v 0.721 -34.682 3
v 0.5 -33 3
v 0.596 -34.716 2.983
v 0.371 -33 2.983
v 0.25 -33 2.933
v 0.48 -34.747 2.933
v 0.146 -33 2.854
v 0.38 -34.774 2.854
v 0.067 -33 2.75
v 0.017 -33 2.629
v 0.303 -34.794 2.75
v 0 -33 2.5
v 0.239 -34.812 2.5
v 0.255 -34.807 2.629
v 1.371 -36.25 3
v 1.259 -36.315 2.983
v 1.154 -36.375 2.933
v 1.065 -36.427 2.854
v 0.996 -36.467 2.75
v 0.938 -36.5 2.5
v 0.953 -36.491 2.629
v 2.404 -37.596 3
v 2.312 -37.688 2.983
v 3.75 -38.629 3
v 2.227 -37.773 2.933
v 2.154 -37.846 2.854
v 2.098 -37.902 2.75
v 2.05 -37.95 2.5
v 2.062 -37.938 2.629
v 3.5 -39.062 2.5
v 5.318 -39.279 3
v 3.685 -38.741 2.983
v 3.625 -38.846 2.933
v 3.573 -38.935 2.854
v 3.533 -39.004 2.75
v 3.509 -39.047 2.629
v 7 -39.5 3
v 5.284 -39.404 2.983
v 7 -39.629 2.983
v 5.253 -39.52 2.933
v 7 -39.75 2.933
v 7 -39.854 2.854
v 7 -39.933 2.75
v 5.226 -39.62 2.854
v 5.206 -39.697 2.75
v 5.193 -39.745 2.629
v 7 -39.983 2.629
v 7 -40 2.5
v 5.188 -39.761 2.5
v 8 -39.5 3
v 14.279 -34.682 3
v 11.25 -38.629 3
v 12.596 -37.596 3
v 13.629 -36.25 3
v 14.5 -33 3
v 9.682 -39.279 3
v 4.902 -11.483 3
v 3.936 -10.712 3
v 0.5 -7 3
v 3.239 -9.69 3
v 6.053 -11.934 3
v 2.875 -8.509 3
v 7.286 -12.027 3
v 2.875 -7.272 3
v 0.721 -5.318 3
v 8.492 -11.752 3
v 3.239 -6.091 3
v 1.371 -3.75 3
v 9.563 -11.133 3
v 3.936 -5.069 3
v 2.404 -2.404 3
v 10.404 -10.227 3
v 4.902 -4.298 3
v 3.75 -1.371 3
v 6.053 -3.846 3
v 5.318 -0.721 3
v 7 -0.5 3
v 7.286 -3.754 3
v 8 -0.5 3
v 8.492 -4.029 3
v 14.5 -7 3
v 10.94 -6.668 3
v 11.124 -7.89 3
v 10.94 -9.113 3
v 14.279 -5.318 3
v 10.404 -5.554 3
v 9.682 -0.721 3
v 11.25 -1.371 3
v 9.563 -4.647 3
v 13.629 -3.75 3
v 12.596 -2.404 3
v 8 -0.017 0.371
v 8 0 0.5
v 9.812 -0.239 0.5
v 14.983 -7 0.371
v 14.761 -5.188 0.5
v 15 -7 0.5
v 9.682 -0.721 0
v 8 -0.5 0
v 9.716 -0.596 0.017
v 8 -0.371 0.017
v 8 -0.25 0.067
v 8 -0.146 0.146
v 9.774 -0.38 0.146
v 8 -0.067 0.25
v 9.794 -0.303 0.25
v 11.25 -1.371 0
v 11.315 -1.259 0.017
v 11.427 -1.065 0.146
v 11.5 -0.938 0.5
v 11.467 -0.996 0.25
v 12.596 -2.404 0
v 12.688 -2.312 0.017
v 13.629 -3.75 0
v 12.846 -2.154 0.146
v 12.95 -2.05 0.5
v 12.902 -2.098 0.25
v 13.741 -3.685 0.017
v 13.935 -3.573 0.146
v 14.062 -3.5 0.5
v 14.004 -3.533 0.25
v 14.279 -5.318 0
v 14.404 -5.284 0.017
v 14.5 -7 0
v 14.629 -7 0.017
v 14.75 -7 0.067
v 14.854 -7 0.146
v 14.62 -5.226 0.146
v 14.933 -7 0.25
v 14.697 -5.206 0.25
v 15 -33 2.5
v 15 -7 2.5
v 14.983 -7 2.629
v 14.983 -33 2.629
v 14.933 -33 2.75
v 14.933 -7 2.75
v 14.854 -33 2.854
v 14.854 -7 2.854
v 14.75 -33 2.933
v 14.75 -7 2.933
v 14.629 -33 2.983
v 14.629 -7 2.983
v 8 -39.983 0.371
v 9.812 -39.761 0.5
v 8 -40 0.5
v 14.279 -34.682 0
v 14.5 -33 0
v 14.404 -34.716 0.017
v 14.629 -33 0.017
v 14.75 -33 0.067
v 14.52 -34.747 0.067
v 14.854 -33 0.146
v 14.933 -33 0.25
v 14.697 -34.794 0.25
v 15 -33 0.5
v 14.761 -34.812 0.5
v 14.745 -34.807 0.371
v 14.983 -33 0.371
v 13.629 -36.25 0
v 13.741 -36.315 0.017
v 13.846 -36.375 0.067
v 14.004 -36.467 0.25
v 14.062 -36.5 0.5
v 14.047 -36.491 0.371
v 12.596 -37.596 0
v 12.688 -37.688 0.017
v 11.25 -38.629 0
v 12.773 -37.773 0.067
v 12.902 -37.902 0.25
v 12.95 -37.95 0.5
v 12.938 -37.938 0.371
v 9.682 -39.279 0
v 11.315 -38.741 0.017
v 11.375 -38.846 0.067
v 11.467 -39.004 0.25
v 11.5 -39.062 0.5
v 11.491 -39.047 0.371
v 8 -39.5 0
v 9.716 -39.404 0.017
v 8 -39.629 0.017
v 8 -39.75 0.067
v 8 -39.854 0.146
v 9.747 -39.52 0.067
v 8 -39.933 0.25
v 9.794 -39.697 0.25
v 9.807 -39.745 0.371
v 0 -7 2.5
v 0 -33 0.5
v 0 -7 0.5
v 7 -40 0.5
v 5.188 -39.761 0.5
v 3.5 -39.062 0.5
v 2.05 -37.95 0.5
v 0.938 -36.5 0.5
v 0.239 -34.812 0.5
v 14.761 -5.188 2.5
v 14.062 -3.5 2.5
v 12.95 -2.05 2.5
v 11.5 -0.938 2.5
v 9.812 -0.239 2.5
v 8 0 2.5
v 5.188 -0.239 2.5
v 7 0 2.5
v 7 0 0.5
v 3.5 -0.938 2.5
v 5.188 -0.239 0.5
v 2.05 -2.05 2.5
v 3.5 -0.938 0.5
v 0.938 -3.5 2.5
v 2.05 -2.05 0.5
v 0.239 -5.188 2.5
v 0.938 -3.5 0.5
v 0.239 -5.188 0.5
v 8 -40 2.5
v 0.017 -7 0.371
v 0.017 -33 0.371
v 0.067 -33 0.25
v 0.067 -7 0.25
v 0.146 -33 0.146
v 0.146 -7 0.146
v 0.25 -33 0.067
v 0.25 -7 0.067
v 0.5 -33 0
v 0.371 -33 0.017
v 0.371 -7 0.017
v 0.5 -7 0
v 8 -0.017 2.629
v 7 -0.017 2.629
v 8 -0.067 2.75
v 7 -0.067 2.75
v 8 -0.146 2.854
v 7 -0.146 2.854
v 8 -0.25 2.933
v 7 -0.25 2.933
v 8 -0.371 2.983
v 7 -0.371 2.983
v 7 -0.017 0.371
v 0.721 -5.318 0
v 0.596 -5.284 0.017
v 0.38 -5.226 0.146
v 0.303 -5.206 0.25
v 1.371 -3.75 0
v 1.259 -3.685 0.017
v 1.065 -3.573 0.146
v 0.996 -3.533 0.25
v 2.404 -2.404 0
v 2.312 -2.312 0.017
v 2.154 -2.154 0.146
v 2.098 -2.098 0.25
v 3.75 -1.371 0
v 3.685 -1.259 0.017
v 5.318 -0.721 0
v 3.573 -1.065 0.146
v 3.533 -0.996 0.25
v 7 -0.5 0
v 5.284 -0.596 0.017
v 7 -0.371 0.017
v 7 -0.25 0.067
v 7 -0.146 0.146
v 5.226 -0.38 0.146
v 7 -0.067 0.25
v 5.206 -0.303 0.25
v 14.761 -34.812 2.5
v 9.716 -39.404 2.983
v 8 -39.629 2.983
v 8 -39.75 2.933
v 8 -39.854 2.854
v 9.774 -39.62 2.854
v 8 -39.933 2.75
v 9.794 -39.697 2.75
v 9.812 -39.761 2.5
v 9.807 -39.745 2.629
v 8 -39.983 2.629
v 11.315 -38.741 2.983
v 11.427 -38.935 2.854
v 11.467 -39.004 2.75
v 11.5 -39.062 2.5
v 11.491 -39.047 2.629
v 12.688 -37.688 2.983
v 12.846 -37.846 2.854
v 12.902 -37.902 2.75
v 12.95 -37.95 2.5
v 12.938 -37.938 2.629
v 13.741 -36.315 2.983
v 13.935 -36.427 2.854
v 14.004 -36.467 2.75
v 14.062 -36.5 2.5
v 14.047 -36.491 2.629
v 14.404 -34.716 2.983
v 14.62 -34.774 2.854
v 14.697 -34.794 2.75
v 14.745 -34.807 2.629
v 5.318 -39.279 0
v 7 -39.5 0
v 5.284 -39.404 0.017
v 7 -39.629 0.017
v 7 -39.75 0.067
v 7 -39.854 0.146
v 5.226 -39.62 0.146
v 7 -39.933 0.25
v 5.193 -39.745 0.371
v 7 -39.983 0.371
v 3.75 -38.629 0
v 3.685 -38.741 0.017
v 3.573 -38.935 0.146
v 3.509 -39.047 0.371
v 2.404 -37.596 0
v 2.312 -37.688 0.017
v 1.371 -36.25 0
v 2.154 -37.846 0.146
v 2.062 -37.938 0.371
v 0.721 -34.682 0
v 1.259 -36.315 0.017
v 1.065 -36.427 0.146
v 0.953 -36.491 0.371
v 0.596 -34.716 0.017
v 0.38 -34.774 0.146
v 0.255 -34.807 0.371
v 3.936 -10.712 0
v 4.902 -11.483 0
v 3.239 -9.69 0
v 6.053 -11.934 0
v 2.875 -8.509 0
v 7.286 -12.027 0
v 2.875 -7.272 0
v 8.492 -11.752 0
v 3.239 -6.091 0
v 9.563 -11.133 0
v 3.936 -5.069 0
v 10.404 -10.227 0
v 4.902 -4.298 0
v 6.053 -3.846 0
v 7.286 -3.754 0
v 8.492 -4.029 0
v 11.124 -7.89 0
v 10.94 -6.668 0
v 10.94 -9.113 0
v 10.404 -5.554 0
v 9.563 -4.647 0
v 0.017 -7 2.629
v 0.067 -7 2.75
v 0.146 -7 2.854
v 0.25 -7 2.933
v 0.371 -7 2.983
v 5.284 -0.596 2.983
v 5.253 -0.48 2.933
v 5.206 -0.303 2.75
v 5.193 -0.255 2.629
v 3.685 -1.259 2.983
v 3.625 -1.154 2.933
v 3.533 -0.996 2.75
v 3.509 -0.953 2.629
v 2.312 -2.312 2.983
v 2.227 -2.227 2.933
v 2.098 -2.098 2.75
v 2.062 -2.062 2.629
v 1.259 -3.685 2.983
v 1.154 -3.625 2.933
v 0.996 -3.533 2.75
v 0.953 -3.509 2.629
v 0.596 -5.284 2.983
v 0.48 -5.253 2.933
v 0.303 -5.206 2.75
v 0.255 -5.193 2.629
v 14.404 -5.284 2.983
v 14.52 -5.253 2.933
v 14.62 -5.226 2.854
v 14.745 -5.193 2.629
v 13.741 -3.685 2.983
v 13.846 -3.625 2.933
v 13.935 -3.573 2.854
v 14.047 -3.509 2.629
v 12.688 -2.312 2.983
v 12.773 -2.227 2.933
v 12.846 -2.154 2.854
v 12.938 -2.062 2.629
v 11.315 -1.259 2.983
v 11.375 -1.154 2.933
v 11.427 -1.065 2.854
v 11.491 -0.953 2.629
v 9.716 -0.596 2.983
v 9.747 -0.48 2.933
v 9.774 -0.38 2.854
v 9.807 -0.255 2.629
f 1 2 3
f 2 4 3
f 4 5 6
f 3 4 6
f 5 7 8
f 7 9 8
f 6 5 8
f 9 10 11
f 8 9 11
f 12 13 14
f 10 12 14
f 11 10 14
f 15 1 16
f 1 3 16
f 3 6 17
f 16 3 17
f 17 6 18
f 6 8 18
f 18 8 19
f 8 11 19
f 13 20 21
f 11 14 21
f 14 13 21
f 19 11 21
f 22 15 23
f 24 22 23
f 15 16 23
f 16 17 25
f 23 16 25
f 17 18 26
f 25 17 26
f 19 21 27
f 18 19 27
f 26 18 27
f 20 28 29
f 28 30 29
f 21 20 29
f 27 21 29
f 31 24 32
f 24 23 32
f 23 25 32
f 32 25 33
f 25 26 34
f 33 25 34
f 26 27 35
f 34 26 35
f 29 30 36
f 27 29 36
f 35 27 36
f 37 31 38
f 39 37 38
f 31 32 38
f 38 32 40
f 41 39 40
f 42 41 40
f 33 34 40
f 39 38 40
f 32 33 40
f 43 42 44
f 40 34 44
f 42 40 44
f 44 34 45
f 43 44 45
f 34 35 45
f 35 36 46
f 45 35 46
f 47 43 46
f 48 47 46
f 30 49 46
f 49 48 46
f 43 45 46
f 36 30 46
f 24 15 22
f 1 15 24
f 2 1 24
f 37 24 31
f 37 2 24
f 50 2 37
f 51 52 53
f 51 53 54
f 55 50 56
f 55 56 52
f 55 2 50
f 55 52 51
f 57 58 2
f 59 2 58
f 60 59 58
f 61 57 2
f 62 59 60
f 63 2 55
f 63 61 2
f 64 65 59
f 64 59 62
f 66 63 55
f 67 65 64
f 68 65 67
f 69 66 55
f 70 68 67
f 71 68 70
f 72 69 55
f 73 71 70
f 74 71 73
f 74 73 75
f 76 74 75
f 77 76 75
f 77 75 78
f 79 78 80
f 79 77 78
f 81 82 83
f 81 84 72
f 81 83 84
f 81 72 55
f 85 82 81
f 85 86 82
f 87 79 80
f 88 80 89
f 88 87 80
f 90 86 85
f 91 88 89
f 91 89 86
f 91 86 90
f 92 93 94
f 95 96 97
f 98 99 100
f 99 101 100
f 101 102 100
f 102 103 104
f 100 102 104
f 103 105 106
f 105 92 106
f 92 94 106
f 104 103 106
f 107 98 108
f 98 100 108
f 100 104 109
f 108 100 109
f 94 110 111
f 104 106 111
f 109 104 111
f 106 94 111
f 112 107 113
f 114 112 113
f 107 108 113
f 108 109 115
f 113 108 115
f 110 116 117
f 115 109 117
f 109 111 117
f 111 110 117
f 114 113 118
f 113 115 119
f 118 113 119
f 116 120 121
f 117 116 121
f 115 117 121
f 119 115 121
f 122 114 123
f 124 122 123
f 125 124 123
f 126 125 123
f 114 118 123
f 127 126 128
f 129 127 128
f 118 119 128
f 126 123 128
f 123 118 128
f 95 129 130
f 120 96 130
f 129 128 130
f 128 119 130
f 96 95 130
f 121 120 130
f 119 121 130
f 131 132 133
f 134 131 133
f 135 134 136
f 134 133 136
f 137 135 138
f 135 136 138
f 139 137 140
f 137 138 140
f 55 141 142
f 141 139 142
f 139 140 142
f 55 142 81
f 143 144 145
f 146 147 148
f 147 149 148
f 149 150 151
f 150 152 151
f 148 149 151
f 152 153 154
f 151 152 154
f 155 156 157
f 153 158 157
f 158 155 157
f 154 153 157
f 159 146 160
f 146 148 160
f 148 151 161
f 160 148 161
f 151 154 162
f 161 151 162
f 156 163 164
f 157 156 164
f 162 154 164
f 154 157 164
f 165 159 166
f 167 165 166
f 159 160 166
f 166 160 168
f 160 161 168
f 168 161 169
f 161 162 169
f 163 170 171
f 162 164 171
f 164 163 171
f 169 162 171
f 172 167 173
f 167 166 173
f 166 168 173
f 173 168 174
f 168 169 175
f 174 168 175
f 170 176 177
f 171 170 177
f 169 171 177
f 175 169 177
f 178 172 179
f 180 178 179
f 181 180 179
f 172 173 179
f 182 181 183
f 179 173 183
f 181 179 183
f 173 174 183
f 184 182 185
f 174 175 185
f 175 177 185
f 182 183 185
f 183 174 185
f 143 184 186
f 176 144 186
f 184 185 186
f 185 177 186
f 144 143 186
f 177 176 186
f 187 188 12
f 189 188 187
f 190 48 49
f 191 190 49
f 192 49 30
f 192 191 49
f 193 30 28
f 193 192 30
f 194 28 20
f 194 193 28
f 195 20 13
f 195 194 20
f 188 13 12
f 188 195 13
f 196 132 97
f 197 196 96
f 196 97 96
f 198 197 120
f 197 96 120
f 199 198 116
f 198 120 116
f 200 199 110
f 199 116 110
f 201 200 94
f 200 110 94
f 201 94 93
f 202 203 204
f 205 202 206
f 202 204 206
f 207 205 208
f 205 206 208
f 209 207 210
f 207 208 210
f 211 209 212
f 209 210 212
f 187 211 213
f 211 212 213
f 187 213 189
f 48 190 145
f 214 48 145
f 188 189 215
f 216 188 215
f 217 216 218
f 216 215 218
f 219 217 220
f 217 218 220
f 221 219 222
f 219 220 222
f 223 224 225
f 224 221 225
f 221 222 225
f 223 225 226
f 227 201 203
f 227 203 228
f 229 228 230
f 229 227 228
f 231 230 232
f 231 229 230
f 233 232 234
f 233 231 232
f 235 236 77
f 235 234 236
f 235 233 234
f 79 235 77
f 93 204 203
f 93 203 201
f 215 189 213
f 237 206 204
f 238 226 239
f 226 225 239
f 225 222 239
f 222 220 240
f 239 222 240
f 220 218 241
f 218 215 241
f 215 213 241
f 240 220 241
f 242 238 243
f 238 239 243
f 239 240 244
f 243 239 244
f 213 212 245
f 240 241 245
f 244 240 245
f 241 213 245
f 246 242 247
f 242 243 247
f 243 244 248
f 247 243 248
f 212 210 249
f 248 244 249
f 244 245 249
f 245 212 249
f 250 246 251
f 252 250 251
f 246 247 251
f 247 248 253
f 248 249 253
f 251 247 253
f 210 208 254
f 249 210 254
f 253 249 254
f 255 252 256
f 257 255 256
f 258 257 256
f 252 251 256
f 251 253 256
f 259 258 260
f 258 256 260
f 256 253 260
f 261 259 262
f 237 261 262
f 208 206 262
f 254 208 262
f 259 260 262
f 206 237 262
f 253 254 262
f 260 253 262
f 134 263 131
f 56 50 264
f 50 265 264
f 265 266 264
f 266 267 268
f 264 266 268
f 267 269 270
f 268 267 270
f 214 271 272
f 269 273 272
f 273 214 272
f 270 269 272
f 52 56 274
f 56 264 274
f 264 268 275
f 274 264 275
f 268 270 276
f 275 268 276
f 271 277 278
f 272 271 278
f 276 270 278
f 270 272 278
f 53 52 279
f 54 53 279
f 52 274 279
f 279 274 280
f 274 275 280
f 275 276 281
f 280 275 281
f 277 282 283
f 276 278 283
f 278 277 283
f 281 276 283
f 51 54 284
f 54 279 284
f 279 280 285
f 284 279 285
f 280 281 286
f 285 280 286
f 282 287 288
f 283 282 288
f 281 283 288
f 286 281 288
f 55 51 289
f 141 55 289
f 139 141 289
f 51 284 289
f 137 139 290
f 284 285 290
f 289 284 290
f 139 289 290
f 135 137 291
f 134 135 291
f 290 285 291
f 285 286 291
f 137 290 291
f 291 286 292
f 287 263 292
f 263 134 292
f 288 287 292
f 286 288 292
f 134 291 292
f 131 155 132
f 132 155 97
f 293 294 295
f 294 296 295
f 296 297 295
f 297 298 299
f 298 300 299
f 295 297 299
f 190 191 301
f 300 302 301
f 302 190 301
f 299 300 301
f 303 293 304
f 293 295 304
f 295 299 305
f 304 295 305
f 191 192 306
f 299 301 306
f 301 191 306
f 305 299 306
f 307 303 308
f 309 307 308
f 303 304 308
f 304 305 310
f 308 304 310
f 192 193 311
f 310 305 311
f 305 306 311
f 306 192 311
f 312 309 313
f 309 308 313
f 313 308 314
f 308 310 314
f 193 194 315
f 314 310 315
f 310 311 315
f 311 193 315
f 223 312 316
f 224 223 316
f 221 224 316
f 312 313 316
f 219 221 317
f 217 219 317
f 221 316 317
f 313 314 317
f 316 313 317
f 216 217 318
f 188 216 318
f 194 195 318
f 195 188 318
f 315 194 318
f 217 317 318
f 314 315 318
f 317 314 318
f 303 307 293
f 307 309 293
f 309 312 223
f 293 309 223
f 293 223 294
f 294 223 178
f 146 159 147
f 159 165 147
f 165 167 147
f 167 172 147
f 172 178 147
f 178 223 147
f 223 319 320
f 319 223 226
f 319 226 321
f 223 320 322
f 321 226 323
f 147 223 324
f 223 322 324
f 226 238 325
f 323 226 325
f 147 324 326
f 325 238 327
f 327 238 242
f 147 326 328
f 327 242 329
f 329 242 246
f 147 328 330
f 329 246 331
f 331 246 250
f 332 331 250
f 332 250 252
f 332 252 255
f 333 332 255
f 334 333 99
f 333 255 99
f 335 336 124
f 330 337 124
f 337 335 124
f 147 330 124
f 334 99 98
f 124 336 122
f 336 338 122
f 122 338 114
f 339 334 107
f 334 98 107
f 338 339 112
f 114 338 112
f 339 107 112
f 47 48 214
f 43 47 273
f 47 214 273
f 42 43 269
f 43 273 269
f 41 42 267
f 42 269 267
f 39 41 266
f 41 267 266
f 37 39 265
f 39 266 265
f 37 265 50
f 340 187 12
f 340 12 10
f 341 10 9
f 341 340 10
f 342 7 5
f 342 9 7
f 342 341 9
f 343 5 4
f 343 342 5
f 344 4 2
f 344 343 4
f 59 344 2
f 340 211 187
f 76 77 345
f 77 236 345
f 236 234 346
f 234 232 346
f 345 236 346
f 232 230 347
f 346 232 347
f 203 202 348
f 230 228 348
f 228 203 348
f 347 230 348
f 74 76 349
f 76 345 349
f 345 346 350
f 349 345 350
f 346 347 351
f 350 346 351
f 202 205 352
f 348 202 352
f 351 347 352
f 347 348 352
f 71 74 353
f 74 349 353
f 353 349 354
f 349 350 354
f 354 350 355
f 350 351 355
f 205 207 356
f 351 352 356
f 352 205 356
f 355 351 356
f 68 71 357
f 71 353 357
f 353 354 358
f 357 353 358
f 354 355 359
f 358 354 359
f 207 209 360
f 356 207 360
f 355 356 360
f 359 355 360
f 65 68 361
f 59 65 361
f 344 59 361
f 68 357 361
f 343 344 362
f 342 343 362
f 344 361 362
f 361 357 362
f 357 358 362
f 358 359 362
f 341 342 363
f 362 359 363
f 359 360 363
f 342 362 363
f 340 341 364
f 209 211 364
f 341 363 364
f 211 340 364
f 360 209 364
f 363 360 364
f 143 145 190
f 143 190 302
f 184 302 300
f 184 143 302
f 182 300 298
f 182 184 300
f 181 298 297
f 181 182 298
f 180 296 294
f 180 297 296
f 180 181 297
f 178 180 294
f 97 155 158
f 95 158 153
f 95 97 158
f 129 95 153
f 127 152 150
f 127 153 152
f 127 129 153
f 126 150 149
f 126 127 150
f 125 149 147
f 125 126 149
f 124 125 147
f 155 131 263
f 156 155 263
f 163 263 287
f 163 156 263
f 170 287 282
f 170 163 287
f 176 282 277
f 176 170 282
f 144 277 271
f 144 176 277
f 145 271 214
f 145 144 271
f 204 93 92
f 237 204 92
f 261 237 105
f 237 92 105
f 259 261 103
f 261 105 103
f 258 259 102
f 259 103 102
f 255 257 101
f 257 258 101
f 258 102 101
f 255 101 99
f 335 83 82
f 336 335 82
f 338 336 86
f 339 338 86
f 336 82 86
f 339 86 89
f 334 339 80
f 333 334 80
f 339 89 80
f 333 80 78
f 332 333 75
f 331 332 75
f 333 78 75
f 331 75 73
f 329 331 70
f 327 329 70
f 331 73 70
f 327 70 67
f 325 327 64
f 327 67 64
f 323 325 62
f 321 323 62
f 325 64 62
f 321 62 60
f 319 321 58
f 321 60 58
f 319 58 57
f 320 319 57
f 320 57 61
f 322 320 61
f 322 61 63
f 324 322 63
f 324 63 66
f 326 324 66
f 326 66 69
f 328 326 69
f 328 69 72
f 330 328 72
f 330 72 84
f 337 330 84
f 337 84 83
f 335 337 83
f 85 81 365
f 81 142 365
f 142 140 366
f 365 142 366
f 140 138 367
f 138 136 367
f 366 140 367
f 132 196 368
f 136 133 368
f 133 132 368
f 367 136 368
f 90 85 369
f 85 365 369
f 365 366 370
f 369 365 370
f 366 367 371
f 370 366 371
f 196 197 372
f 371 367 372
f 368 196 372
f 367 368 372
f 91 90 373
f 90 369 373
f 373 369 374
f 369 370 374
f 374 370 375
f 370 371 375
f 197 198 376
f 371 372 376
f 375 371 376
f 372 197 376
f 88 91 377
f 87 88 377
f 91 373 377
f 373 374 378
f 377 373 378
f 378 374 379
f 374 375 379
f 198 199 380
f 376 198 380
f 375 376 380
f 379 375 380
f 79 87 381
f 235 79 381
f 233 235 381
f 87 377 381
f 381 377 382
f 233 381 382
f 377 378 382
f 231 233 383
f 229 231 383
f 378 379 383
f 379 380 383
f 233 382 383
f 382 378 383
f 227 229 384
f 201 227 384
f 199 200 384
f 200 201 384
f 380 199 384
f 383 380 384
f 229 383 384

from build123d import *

# Parameters (mm, degrees)
F0_W         = 15
F0_H         = 40
F1_DEPTH     = 3
F2_R         = 0.5
F3_T1_DEPTH  = 3
F3_T4_ANGLE  = 90
F3_T6_ANGLE  = 90
F3_T8_ANGLE  = 90
F3_T10_ANGLE = 90
F3_T12_ANGLE = 90
F3_T14_ANGLE = 90
F3_T16_ANGLE = 90
F3_T18_ANGLE = 90
F4_R         = 4.1479676184
F5_DEPTH     = 25


# Not quite as in the source:
# - a fillet or chamfer that OpenCascade refuses, or shapes differently, is made with other operations: its cross-section is extruded or revolved along the edge and cut away or added


with BuildPart() as f1:
    # F0 (on Top) → F1 (new body)
    with BuildSketch(Plane.XY):
        with Locations((7.5, -20)):
            Rectangle(F0_W, F0_H)
    extrude(amount=F1_DEPTH)

    # F2
    f2_edges = [f1.edges().sort_by_distance(p)[0] for p in [
        (15, -20, 3),
        (7.5, 0, 3),
        (0, -20, 3),
        (7.5, -40, 3),
        (15, -20, 0),
        (7.5, 0, 0),
        (0, -20, 0),
        (7.5, -40, 0),
    ]]
    fillet(f2_edges, radius=F2_R)

    # F3: fillet of radius 7 on 4 edges, made by hand

    # F3_s2 → F3_t1 (cut)
    with BuildSketch(Plane.XY):
        with BuildLine():
            ThreePointArc((15, -7), (12.9497474683, -2.0502525317), (8, 0))
            Line((8, 0), (15, 0))
            Line((15, 0), (15, -7))
        make_face()
        with BuildLine():
            ThreePointArc((7, 0), (2.0502525317, -2.0502525317), (0, -7))
            Line((0, -7), (0, 0))
            Line((0, 0), (7, 0))
        make_face()
        with BuildLine():
            ThreePointArc((15, -33), (12.9497474683, -37.9497474683), (8, -40))
            Line((8, -40), (15, -40))
            Line((15, -40), (15, -33))
        make_face()
        with BuildLine():
            ThreePointArc((7, -40), (2.0502525317, -37.9497474683), (0, -33))
            Line((0, -33), (0, -40))
            Line((0, -40), (7, -40))
        make_face()
    extrude(amount=F3_T1_DEPTH, mode=Mode.SUBTRACT)

    # F3_s3 → F3_t4 (revolve, cut)
    with BuildSketch(Plane.YZ.offset(7)):
        with BuildLine():
            ThreePointArc((-39.5, 0), (-39.8535533906, 0.1464466094), (-40, 0.5))
            Line((-40, 0.5), (-40, 0))
            Line((-40, 0), (-39.5, 0))
        make_face()
    revolve(axis=Axis((7, -33, 0), (0, 0, -1)), revolution_arc=F3_T4_ANGLE, mode=Mode.SUBTRACT)

    # F3_s5 → F3_t6 (revolve, cut)
    with BuildSketch(Plane.XZ.offset(33)):
        with BuildLine():
            ThreePointArc((0.5, 3), (0.1464466094, 2.8535533906), (0, 2.5))
            Line((0, 2.5), (0, 3))
            Line((0, 3), (0.5, 3))
        make_face()
    revolve(axis=Axis((7, -33, 3), (0, 0, 1)), revolution_arc=F3_T6_ANGLE, mode=Mode.SUBTRACT)

    # F3_s7 → F3_t8 (revolve, cut)
    with BuildSketch(Plane.XZ.offset(33)):
        with BuildLine():
            ThreePointArc((14.5, 0), (14.8535533906, 0.1464466094), (15, 0.5))
            Line((15, 0.5), (15, 0))
            Line((15, 0), (14.5, 0))
        make_face()
    revolve(axis=Axis((8, -33, 0), (0, 0, -1)), revolution_arc=F3_T8_ANGLE, mode=Mode.SUBTRACT)

    # F3_s9 → F3_t10 (revolve, cut)
    with BuildSketch(Plane.YZ.offset(8)):
        with BuildLine():
            ThreePointArc((-39.5, 3), (-39.8535533906, 2.8535533906), (-40, 2.5))
            Line((-40, 2.5), (-40, 3))
            Line((-40, 3), (-39.5, 3))
        make_face()
    revolve(axis=Axis((8, -33, 3), (0, 0, 1)), revolution_arc=F3_T10_ANGLE, mode=Mode.SUBTRACT)

    # F3_s11 → F3_t12 (revolve, cut)
    with BuildSketch(Plane.XZ.offset(7)):
        with BuildLine():
            ThreePointArc((0.5, 0), (0.1464466094, 0.1464466094), (0, 0.5))
            Line((0, 0.5), (0, 0))
            Line((0, 0), (0.5, 0))
        make_face()
    revolve(axis=Axis((7, -7, 0), (0, 0, -1)), revolution_arc=F3_T12_ANGLE, mode=Mode.SUBTRACT)

    # F3_s13 → F3_t14 (revolve, cut)
    with BuildSketch(Plane.YZ.offset(7)):
        with BuildLine():
            ThreePointArc((-0.5, 3), (-0.1464466094, 2.8535533906), (0, 2.5))
            Line((0, 2.5), (0, 3))
            Line((0, 3), (-0.5, 3))
        make_face()
    revolve(axis=Axis((7, -7, 3), (0, 0, 1)), revolution_arc=F3_T14_ANGLE, mode=Mode.SUBTRACT)

    # F3_s15 → F3_t16 (revolve, cut)
    with BuildSketch(Plane.YZ.offset(8)):
        with BuildLine():
            ThreePointArc((-0.5, 0), (-0.1464466094, 0.1464466094), (0, 0.5))
            Line((0, 0.5), (0, 0))
            Line((0, 0), (-0.5, 0))
        make_face()
    revolve(axis=Axis((8, -7, 0), (0, 0, -1)), revolution_arc=F3_T16_ANGLE, mode=Mode.SUBTRACT)

    # F3_s17 → F3_t18 (revolve, cut)
    with BuildSketch(Plane.XZ.offset(7)):
        with BuildLine():
            ThreePointArc((14.5, 3), (14.8535533906, 2.8535533906), (15, 2.5))
            Line((15, 2.5), (15, 3))
            Line((15, 3), (14.5, 3))
        make_face()
    revolve(axis=Axis((8, -7, 3), (0, 0, 1)), revolution_arc=F3_T18_ANGLE, mode=Mode.SUBTRACT)

    # F4 (on face) → F5 (cut)
    with BuildSketch(Plane.XY.offset(3)):
        with Locations((6.9764298387, -7.8903073445)):
            Circle(F4_R)
    extrude(amount=-F5_DEPTH, mode=Mode.SUBTRACT)


solid = f1.part
